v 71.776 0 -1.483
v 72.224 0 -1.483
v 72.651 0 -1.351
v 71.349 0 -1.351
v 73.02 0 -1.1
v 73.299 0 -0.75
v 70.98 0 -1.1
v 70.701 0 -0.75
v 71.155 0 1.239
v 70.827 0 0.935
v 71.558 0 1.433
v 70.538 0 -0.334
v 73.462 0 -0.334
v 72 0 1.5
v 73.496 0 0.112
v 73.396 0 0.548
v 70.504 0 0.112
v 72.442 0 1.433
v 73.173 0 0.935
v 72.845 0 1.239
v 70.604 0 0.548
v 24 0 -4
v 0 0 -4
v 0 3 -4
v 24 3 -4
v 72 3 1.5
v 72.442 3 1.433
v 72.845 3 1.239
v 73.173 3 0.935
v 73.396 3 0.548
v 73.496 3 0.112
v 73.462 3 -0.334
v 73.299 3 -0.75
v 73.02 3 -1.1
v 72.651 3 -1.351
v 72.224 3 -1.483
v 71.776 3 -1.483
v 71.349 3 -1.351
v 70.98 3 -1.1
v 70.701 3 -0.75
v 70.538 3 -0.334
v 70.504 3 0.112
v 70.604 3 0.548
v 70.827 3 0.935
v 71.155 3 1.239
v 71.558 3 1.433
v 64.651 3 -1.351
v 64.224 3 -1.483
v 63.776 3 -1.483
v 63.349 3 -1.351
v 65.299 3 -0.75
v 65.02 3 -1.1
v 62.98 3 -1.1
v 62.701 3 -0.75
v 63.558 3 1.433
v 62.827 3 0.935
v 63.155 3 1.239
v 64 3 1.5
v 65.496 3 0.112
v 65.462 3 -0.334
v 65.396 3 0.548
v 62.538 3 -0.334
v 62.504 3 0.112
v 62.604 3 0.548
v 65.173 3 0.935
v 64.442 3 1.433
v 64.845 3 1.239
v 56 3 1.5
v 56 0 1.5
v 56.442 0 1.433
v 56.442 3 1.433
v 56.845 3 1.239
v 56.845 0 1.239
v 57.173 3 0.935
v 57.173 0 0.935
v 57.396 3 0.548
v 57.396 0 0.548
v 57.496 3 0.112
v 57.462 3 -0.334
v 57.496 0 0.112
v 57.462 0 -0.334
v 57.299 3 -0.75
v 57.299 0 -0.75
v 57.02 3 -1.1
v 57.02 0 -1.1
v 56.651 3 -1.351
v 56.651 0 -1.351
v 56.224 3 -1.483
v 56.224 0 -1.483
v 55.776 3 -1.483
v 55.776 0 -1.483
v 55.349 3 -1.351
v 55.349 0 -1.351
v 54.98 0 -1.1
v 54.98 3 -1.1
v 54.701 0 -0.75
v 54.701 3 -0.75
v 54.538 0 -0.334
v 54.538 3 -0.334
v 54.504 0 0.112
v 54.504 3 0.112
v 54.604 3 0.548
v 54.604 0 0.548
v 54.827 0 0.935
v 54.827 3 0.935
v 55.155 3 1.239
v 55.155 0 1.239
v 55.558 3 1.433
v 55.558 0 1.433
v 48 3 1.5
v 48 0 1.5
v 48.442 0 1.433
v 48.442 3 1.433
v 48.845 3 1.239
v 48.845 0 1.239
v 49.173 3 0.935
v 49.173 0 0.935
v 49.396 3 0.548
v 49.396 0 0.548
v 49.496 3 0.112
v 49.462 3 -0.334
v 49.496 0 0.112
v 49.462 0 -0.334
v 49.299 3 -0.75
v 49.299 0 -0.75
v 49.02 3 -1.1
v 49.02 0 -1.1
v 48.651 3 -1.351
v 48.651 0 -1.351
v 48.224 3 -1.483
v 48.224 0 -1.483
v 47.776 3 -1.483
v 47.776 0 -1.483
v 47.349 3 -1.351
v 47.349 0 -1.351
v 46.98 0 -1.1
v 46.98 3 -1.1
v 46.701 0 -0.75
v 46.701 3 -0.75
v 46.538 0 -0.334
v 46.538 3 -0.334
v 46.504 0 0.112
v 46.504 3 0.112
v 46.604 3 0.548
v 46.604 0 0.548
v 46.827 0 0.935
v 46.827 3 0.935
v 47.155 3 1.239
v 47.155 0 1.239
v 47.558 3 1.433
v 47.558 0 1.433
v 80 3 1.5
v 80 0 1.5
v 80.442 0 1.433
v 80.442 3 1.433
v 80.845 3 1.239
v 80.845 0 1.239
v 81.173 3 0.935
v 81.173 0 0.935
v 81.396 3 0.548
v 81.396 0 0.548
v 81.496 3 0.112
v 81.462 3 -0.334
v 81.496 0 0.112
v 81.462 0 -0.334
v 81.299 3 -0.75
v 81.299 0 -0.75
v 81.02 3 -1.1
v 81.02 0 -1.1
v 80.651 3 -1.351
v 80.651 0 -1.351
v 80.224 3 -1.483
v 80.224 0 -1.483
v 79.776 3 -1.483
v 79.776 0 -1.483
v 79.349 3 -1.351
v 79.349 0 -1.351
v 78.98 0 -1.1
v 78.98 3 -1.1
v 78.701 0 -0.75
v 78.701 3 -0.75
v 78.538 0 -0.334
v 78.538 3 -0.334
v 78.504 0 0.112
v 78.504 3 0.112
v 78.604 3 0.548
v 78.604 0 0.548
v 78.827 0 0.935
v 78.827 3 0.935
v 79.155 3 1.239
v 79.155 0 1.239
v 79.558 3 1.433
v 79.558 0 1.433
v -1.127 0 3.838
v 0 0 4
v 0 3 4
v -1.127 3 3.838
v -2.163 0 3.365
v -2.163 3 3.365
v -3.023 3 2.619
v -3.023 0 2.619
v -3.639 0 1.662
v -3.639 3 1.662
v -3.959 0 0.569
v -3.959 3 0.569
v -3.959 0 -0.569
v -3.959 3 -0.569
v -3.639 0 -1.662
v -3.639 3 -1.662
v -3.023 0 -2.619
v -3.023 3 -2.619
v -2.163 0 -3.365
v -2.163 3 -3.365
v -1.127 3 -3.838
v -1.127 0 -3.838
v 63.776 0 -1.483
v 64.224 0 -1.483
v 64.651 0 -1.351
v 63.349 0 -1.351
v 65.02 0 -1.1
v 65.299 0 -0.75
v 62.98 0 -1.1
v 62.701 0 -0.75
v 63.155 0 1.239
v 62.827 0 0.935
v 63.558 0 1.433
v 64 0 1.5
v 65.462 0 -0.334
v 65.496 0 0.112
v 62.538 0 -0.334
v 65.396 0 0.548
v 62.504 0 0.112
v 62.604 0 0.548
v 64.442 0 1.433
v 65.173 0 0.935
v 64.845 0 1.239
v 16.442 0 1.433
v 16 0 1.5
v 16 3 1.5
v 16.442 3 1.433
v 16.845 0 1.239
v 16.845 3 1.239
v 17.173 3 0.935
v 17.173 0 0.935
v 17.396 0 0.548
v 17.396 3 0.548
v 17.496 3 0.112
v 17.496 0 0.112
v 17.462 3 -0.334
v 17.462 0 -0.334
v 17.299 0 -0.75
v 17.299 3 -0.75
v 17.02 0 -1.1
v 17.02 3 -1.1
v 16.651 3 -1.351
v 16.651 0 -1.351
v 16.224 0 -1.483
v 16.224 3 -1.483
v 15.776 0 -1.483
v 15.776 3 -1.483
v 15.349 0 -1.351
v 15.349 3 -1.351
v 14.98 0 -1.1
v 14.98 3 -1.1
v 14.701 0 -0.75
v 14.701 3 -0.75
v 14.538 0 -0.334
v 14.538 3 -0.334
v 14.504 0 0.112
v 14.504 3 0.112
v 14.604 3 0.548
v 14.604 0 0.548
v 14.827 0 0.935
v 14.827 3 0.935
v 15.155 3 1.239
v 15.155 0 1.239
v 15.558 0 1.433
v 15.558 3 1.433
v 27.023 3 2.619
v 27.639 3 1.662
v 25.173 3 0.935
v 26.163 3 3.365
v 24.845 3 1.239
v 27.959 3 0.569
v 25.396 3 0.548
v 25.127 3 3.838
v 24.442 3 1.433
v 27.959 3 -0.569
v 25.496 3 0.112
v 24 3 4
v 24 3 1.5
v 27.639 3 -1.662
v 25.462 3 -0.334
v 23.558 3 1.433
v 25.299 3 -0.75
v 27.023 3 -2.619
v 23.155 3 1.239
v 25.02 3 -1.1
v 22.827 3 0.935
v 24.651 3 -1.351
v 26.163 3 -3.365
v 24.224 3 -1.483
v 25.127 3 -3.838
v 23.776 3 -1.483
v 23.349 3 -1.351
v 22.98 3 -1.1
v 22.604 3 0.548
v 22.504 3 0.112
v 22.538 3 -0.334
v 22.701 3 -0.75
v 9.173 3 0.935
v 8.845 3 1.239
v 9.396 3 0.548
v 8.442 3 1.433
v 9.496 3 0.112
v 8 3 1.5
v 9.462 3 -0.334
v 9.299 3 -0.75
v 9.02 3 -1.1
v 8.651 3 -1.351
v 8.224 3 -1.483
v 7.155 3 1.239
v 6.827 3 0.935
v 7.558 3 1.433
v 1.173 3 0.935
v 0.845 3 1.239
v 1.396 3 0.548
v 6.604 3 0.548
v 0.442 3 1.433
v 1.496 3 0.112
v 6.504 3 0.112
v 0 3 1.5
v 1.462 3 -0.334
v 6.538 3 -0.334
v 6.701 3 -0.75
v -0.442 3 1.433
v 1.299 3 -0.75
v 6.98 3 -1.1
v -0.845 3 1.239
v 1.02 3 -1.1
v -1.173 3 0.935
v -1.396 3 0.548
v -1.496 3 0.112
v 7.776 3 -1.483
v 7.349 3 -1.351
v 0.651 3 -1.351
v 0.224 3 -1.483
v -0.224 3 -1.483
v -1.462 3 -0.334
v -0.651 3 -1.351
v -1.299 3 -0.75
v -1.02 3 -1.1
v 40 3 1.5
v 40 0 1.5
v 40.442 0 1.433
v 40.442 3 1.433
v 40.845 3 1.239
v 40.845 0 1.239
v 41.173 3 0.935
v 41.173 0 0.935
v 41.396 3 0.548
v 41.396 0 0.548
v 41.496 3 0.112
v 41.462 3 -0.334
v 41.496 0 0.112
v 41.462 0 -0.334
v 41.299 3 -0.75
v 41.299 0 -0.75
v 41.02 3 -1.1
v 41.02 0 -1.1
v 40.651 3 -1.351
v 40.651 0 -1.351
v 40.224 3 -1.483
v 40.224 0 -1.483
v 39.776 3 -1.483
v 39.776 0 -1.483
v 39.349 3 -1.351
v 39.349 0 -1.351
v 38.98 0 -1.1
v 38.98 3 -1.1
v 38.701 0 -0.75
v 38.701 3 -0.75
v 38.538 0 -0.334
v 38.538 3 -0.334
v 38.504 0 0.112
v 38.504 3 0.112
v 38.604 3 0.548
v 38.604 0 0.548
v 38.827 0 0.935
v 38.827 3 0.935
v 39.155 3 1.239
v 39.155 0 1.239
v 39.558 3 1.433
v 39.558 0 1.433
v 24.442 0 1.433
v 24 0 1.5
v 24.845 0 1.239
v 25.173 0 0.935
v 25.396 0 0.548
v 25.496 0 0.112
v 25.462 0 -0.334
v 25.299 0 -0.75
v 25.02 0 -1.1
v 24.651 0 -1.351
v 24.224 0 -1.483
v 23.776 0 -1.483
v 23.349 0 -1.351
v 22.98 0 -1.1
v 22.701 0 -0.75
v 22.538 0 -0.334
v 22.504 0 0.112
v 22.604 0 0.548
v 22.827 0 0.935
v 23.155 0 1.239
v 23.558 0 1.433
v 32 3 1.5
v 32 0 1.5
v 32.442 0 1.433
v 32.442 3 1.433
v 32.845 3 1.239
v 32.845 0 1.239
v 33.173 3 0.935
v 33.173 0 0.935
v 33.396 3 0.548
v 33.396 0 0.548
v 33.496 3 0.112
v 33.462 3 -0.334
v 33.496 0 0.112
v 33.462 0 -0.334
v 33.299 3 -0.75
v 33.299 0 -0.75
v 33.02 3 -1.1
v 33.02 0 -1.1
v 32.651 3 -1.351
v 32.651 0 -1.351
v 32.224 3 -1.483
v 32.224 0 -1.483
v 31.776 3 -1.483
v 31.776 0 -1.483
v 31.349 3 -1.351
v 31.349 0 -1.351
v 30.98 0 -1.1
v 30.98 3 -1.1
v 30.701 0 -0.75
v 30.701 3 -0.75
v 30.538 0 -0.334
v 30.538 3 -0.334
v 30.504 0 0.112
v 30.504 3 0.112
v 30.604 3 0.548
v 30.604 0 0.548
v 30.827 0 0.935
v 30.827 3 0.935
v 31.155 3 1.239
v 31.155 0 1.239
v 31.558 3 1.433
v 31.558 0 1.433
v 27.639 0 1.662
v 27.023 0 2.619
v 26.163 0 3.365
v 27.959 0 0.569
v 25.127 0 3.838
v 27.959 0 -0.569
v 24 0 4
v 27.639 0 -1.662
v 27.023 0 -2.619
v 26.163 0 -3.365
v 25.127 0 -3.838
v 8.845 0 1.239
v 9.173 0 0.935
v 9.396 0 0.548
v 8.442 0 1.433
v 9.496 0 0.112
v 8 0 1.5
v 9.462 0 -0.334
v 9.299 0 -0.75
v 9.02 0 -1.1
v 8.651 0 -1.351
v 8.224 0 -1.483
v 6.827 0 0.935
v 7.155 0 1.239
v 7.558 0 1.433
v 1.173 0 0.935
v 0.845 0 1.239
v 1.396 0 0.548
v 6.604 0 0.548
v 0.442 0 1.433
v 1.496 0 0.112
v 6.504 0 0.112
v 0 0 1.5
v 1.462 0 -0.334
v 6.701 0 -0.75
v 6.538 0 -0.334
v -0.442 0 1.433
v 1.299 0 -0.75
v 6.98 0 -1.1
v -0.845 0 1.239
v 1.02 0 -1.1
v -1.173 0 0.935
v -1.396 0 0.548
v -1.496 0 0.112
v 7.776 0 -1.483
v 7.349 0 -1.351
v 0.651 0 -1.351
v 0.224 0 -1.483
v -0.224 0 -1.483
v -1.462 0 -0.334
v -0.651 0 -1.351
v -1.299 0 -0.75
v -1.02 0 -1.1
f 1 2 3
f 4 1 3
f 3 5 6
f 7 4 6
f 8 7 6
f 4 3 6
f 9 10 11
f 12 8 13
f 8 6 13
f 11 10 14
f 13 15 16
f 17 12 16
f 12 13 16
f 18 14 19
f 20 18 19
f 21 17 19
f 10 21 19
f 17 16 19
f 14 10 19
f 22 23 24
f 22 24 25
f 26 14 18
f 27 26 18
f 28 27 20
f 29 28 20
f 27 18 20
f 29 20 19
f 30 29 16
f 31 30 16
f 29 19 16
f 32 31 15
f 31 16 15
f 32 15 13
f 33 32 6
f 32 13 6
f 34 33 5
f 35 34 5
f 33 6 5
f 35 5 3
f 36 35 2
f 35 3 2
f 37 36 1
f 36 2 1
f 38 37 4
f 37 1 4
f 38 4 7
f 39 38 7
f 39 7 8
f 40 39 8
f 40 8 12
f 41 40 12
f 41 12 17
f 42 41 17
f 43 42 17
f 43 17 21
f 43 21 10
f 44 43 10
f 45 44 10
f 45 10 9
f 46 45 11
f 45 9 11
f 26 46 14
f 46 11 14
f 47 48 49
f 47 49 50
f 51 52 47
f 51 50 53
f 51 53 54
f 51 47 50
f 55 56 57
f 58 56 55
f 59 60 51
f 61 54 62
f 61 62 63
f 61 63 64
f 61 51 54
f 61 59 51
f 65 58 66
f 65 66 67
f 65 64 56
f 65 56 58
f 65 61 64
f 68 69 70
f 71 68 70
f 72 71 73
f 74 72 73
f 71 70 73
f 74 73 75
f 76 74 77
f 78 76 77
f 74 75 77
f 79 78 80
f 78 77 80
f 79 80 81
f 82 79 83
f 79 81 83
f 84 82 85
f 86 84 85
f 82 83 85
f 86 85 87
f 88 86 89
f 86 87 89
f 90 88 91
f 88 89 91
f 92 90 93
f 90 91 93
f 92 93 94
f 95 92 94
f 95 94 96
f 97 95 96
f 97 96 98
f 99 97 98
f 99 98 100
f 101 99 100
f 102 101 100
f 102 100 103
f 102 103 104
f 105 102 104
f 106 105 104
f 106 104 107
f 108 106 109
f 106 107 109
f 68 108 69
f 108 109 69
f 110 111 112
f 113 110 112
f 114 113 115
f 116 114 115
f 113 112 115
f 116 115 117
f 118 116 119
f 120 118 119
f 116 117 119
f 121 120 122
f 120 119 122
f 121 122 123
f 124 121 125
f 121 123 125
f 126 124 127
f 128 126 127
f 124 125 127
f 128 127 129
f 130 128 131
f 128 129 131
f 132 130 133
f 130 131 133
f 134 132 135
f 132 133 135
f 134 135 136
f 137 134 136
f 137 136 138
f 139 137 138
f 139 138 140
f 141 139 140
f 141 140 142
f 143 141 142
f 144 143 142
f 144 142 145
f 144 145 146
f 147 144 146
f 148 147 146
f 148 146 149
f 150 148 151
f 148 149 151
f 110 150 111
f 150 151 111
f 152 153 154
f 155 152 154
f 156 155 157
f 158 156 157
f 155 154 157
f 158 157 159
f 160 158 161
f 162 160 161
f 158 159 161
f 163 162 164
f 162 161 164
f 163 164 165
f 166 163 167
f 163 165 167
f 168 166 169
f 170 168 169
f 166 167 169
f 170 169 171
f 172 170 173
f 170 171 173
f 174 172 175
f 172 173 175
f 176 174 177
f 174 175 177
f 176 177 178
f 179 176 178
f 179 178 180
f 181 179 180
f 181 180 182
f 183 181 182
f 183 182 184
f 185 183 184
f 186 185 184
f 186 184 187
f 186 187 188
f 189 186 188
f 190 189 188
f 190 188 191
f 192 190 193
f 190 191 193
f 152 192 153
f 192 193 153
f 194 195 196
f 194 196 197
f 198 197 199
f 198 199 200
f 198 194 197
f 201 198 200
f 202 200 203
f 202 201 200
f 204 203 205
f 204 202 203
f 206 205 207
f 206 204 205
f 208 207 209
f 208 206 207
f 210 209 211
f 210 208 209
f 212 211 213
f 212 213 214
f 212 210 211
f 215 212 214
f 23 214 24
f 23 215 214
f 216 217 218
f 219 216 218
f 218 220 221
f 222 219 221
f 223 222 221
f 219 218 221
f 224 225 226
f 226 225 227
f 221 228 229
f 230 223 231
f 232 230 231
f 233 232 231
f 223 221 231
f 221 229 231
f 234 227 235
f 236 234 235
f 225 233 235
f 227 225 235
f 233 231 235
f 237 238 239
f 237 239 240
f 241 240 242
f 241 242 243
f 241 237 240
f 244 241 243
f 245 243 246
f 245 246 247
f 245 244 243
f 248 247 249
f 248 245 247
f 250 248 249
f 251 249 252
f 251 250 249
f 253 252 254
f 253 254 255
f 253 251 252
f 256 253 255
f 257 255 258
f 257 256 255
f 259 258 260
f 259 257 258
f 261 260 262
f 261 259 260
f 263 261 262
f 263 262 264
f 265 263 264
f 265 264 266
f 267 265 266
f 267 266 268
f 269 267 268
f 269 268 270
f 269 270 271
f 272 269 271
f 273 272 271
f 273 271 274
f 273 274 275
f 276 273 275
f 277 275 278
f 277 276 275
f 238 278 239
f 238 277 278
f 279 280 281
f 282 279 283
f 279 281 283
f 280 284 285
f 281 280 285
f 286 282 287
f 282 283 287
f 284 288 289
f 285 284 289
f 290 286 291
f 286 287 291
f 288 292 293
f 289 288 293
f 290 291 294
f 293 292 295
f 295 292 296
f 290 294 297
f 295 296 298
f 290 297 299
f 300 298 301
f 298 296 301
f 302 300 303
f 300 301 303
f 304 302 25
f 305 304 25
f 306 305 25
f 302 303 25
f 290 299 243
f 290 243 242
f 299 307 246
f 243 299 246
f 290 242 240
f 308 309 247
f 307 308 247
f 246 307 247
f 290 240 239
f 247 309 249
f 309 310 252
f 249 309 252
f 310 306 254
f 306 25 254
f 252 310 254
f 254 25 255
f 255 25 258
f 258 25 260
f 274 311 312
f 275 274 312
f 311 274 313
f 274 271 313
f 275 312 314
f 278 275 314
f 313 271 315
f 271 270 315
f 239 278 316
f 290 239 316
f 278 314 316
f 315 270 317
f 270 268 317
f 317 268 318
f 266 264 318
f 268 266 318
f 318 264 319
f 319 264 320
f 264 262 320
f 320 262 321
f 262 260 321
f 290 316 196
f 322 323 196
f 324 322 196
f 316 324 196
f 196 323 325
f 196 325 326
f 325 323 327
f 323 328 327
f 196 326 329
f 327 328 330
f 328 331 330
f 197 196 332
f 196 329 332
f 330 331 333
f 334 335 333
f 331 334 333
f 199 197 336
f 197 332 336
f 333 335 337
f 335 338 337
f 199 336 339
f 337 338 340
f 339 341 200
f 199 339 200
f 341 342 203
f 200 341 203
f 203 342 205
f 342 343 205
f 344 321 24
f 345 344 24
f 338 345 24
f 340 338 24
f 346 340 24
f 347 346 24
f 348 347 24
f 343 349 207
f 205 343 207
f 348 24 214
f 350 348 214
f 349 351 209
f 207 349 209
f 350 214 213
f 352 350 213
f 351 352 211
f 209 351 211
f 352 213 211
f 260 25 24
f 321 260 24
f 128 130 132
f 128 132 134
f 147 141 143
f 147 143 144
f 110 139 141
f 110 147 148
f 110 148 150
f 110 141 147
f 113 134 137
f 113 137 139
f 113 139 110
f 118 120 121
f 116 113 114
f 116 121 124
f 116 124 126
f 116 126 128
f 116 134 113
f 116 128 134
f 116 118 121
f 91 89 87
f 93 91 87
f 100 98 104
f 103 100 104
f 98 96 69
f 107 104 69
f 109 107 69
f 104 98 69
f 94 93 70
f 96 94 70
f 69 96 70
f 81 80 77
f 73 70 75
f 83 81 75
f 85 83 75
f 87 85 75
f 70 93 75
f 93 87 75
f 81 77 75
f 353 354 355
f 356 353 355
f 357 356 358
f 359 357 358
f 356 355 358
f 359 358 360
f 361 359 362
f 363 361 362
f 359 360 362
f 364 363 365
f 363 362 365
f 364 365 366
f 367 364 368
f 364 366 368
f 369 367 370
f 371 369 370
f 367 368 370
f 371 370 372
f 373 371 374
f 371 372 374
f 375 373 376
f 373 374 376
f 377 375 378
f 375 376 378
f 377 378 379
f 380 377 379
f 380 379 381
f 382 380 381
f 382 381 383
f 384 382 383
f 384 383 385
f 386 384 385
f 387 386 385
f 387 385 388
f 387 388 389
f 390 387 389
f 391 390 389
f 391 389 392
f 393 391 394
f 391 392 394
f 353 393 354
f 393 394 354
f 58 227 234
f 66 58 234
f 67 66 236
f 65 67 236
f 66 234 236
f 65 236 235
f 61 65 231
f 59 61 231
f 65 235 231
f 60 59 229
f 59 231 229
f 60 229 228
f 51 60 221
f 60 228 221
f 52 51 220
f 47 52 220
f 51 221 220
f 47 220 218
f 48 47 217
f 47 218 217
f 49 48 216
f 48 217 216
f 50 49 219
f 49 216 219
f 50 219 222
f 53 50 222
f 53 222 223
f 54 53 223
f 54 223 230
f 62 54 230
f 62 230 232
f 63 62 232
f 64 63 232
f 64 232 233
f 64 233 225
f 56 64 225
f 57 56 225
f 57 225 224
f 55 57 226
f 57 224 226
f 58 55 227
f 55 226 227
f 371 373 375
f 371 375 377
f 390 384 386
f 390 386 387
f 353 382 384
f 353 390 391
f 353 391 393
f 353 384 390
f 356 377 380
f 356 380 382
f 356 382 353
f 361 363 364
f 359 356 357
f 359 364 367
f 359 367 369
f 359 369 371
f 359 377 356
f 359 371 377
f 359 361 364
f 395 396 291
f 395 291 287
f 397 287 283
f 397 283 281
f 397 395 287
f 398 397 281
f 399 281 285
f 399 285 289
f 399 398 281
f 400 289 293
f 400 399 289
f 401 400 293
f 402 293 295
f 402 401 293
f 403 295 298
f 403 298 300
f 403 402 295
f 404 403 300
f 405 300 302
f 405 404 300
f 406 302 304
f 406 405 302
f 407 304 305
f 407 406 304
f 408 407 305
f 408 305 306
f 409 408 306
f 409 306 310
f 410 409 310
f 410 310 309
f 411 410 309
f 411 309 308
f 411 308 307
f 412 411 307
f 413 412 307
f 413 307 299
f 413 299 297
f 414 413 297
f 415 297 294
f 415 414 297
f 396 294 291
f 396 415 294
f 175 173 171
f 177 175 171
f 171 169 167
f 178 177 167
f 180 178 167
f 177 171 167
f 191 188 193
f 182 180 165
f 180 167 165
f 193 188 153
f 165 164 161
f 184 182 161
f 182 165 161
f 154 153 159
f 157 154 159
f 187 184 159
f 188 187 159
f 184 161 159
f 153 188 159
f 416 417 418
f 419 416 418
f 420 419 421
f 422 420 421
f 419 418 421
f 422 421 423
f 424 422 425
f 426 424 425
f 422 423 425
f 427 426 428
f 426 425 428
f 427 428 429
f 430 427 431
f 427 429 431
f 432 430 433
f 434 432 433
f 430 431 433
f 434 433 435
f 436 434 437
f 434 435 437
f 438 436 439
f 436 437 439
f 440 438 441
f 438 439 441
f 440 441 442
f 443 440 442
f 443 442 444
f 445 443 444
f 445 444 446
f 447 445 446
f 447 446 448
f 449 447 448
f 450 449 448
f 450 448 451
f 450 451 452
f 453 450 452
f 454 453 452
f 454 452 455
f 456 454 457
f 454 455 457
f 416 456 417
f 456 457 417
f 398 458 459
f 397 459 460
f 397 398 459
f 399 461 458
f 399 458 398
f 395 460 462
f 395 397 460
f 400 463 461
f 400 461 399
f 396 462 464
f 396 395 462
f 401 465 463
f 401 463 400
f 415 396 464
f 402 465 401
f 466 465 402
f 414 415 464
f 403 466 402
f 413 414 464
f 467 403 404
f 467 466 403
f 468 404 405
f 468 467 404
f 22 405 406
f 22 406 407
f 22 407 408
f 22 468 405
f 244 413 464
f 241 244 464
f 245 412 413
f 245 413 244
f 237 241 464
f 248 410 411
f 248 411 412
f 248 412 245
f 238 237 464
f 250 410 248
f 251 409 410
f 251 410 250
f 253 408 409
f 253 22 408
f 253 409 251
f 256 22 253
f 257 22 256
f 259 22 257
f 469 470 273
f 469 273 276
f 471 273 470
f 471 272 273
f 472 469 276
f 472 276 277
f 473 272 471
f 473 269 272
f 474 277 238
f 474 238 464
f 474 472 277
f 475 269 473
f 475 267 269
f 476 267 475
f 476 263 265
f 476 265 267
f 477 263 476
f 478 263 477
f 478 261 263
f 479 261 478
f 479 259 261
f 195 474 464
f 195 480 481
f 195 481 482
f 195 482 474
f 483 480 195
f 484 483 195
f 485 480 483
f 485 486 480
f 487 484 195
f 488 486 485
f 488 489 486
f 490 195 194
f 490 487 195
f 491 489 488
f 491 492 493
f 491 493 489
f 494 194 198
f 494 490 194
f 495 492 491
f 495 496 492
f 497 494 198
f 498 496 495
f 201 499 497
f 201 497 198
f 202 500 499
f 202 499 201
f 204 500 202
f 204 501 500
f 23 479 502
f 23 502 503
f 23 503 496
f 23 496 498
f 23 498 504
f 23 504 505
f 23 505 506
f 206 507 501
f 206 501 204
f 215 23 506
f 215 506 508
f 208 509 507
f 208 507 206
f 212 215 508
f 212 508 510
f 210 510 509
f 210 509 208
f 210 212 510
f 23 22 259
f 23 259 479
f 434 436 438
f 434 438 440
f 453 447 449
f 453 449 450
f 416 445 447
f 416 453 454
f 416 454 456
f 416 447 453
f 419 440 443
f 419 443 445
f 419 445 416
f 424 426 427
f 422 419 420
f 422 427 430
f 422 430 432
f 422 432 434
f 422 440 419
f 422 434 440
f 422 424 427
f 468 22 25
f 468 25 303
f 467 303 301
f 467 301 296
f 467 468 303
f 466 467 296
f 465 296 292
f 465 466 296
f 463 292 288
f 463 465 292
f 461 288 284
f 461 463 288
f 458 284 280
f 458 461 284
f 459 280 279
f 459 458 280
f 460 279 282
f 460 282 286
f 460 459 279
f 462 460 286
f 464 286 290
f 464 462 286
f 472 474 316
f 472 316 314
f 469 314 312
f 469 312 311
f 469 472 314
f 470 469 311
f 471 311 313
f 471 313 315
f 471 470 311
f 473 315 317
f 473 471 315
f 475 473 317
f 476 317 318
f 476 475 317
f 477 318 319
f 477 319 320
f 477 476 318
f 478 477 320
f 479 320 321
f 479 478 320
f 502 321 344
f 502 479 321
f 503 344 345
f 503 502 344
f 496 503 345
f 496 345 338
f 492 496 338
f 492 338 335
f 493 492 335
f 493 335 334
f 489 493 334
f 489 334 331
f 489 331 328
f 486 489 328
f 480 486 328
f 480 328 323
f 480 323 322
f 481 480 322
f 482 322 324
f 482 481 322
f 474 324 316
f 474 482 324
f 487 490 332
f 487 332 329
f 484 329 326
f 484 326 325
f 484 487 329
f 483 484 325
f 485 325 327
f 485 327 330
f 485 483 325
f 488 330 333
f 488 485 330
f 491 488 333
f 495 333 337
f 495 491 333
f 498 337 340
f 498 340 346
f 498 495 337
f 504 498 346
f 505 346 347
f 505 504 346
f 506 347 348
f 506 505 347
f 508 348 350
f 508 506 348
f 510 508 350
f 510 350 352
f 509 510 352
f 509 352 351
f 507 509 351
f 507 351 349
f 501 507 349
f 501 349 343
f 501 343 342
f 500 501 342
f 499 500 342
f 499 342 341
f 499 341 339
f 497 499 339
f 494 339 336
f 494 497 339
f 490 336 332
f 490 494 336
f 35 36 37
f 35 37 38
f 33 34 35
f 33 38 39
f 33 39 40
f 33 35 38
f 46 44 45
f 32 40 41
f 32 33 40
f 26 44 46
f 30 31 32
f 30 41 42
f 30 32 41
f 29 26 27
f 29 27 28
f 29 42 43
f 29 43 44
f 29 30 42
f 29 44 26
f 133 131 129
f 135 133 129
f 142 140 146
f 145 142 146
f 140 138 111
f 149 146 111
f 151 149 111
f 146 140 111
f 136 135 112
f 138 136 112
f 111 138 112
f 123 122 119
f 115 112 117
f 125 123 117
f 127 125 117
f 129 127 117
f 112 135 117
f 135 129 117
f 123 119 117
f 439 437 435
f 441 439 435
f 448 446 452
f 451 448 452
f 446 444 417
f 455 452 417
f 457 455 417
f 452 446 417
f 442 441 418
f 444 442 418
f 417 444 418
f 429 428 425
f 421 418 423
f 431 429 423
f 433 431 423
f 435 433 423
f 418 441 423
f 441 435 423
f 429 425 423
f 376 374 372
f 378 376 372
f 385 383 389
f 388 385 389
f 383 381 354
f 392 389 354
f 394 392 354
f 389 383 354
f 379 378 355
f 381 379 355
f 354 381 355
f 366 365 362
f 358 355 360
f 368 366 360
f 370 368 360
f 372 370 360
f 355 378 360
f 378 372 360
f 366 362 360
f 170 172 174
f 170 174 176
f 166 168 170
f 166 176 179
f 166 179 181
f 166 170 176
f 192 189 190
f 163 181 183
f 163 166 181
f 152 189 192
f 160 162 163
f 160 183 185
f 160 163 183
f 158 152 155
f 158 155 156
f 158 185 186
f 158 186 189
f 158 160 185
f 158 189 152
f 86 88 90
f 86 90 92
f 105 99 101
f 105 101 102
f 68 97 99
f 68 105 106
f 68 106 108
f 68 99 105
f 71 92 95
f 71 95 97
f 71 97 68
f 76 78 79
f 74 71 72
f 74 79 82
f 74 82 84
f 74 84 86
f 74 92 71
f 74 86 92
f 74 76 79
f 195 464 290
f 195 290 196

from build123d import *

# Parameters (mm, degrees)
SKETCH2_R             = 1.5
BOSS_EXTRUDE2_DEPTH   = 3
BOSS_EXTRUDE2_2_DEPTH = 3
BOSS_EXTRUDE2_3_DEPTH = 3
BOSS_EXTRUDE2_4_DEPTH = 3
BOSS_EXTRUDE2_5_DEPTH = 3
BOSS_EXTRUDE2_6_DEPTH = 3
BOSS_EXTRUDE2_7_DEPTH = 3
BOSS_EXTRUDE2_8_DEPTH = 3


with BuildPart() as part:
    # Sketch2 → Boss-Extrude2 (new body)
    with BuildSketch(Plane(origin=(0, 0, 0), x_dir=(1, 0, 0), z_dir=(0, 1, 0))):
        with Locations(Location((32, 0, 0), (0, 0, 270))):
            Circle(SKETCH2_R)
    extrude(amount=BOSS_EXTRUDE2_DEPTH)


with BuildPart() as body_2:
    # Sketch2 → Boss-Extrude2 2 (new body)
    with BuildSketch(Plane(origin=(0, 0, 0), x_dir=(1, 0, 0), z_dir=(0, 1, 0))):
        with Locations(Location((40, 0, 0), (0, 0, 270))):
            Circle(SKETCH2_R)
    extrude(amount=BOSS_EXTRUDE2_2_DEPTH)


with BuildPart() as body_3:
    # Sketch2 → Boss-Extrude2 3 (new body)
    with BuildSketch(Plane(origin=(0, 0, 0), x_dir=(1, 0, 0), z_dir=(0, 1, 0))):
        with Locations(Location((48, 0, 0), (0, 0, 270))):
            Circle(SKETCH2_R)
    extrude(amount=BOSS_EXTRUDE2_3_DEPTH)


with BuildPart() as body_4:
    # Sketch2 → Boss-Extrude2 4 (new body)
    with BuildSketch(Plane(origin=(0, 0, 0), x_dir=(1, 0, 0), z_dir=(0, 1, 0))):
        with Locations(Location((56, 0, 0), (0, 0, 270))):
            Circle(SKETCH2_R)
    extrude(amount=BOSS_EXTRUDE2_4_DEPTH)


with BuildPart() as body_5:
    # Sketch2 → Boss-Extrude2 5 (new body)
    with BuildSketch(Plane(origin=(0, 0, 0), x_dir=(1, 0, 0), z_dir=(0, 1, 0))):
        with Locations(Location((64, 0, 0), (0, 0, 270))):
            Circle(SKETCH2_R)
    extrude(amount=BOSS_EXTRUDE2_5_DEPTH)


with BuildPart() as body_6:
    # Sketch2 → Boss-Extrude2 6 (new body)
    with BuildSketch(Plane(origin=(0, 0, 0), x_dir=(1, 0, 0), z_dir=(0, 1, 0))):
        with Locations(Location((72, 0, 0), (0, 0, 270))):
            Circle(SKETCH2_R)
    extrude(amount=BOSS_EXTRUDE2_6_DEPTH)


with BuildPart() as body_7:
    # Sketch2 → Boss-Extrude2 7 (new body)
    with BuildSketch(Plane(origin=(0, 0, 0), x_dir=(1, 0, 0), z_dir=(0, 1, 0))):
        with Locations(Location((80, 0, 0), (0, 0, 270))):
            Circle(SKETCH2_R)
    extrude(amount=BOSS_EXTRUDE2_7_DEPTH)


with BuildPart() as body_8:
    # Sketch2 → Boss-Extrude2 8 (new body)
    with BuildSketch(Plane(origin=(0, 0, 0), x_dir=(1, 0, 0), z_dir=(0, 1, 0))):
        with BuildLine():
            Line((0, 4), (24, 4))
            ThreePointArc((24, 4), (28, 0), (24, -4))
            Line((24, -4), (0, -4))
            ThreePointArc((0, -4), (-4, 0), (0, 4))
        make_face()
        with Locations(Location((0, 0, 0), (0, 0, 270))):
            Circle(SKETCH2_R, mode=Mode.SUBTRACT)
        with Locations(Location((8, 0, 0), (0, 0, 270))):
            Circle(SKETCH2_R, mode=Mode.SUBTRACT)
        with Locations(Location((16, 0, 0), (0, 0, 270))):
            Circle(SKETCH2_R, mode=Mode.SUBTRACT)
        with Locations(Location((24, 0, 0), (0, 0, 270))):
            Circle(SKETCH2_R, mode=Mode.SUBTRACT)
    extrude(amount=BOSS_EXTRUDE2_8_DEPTH)


solid = Compound([part.part, body_2.part, body_3.part, body_4.part, body_5.part, body_6.part, body_7.part, body_8.part])
